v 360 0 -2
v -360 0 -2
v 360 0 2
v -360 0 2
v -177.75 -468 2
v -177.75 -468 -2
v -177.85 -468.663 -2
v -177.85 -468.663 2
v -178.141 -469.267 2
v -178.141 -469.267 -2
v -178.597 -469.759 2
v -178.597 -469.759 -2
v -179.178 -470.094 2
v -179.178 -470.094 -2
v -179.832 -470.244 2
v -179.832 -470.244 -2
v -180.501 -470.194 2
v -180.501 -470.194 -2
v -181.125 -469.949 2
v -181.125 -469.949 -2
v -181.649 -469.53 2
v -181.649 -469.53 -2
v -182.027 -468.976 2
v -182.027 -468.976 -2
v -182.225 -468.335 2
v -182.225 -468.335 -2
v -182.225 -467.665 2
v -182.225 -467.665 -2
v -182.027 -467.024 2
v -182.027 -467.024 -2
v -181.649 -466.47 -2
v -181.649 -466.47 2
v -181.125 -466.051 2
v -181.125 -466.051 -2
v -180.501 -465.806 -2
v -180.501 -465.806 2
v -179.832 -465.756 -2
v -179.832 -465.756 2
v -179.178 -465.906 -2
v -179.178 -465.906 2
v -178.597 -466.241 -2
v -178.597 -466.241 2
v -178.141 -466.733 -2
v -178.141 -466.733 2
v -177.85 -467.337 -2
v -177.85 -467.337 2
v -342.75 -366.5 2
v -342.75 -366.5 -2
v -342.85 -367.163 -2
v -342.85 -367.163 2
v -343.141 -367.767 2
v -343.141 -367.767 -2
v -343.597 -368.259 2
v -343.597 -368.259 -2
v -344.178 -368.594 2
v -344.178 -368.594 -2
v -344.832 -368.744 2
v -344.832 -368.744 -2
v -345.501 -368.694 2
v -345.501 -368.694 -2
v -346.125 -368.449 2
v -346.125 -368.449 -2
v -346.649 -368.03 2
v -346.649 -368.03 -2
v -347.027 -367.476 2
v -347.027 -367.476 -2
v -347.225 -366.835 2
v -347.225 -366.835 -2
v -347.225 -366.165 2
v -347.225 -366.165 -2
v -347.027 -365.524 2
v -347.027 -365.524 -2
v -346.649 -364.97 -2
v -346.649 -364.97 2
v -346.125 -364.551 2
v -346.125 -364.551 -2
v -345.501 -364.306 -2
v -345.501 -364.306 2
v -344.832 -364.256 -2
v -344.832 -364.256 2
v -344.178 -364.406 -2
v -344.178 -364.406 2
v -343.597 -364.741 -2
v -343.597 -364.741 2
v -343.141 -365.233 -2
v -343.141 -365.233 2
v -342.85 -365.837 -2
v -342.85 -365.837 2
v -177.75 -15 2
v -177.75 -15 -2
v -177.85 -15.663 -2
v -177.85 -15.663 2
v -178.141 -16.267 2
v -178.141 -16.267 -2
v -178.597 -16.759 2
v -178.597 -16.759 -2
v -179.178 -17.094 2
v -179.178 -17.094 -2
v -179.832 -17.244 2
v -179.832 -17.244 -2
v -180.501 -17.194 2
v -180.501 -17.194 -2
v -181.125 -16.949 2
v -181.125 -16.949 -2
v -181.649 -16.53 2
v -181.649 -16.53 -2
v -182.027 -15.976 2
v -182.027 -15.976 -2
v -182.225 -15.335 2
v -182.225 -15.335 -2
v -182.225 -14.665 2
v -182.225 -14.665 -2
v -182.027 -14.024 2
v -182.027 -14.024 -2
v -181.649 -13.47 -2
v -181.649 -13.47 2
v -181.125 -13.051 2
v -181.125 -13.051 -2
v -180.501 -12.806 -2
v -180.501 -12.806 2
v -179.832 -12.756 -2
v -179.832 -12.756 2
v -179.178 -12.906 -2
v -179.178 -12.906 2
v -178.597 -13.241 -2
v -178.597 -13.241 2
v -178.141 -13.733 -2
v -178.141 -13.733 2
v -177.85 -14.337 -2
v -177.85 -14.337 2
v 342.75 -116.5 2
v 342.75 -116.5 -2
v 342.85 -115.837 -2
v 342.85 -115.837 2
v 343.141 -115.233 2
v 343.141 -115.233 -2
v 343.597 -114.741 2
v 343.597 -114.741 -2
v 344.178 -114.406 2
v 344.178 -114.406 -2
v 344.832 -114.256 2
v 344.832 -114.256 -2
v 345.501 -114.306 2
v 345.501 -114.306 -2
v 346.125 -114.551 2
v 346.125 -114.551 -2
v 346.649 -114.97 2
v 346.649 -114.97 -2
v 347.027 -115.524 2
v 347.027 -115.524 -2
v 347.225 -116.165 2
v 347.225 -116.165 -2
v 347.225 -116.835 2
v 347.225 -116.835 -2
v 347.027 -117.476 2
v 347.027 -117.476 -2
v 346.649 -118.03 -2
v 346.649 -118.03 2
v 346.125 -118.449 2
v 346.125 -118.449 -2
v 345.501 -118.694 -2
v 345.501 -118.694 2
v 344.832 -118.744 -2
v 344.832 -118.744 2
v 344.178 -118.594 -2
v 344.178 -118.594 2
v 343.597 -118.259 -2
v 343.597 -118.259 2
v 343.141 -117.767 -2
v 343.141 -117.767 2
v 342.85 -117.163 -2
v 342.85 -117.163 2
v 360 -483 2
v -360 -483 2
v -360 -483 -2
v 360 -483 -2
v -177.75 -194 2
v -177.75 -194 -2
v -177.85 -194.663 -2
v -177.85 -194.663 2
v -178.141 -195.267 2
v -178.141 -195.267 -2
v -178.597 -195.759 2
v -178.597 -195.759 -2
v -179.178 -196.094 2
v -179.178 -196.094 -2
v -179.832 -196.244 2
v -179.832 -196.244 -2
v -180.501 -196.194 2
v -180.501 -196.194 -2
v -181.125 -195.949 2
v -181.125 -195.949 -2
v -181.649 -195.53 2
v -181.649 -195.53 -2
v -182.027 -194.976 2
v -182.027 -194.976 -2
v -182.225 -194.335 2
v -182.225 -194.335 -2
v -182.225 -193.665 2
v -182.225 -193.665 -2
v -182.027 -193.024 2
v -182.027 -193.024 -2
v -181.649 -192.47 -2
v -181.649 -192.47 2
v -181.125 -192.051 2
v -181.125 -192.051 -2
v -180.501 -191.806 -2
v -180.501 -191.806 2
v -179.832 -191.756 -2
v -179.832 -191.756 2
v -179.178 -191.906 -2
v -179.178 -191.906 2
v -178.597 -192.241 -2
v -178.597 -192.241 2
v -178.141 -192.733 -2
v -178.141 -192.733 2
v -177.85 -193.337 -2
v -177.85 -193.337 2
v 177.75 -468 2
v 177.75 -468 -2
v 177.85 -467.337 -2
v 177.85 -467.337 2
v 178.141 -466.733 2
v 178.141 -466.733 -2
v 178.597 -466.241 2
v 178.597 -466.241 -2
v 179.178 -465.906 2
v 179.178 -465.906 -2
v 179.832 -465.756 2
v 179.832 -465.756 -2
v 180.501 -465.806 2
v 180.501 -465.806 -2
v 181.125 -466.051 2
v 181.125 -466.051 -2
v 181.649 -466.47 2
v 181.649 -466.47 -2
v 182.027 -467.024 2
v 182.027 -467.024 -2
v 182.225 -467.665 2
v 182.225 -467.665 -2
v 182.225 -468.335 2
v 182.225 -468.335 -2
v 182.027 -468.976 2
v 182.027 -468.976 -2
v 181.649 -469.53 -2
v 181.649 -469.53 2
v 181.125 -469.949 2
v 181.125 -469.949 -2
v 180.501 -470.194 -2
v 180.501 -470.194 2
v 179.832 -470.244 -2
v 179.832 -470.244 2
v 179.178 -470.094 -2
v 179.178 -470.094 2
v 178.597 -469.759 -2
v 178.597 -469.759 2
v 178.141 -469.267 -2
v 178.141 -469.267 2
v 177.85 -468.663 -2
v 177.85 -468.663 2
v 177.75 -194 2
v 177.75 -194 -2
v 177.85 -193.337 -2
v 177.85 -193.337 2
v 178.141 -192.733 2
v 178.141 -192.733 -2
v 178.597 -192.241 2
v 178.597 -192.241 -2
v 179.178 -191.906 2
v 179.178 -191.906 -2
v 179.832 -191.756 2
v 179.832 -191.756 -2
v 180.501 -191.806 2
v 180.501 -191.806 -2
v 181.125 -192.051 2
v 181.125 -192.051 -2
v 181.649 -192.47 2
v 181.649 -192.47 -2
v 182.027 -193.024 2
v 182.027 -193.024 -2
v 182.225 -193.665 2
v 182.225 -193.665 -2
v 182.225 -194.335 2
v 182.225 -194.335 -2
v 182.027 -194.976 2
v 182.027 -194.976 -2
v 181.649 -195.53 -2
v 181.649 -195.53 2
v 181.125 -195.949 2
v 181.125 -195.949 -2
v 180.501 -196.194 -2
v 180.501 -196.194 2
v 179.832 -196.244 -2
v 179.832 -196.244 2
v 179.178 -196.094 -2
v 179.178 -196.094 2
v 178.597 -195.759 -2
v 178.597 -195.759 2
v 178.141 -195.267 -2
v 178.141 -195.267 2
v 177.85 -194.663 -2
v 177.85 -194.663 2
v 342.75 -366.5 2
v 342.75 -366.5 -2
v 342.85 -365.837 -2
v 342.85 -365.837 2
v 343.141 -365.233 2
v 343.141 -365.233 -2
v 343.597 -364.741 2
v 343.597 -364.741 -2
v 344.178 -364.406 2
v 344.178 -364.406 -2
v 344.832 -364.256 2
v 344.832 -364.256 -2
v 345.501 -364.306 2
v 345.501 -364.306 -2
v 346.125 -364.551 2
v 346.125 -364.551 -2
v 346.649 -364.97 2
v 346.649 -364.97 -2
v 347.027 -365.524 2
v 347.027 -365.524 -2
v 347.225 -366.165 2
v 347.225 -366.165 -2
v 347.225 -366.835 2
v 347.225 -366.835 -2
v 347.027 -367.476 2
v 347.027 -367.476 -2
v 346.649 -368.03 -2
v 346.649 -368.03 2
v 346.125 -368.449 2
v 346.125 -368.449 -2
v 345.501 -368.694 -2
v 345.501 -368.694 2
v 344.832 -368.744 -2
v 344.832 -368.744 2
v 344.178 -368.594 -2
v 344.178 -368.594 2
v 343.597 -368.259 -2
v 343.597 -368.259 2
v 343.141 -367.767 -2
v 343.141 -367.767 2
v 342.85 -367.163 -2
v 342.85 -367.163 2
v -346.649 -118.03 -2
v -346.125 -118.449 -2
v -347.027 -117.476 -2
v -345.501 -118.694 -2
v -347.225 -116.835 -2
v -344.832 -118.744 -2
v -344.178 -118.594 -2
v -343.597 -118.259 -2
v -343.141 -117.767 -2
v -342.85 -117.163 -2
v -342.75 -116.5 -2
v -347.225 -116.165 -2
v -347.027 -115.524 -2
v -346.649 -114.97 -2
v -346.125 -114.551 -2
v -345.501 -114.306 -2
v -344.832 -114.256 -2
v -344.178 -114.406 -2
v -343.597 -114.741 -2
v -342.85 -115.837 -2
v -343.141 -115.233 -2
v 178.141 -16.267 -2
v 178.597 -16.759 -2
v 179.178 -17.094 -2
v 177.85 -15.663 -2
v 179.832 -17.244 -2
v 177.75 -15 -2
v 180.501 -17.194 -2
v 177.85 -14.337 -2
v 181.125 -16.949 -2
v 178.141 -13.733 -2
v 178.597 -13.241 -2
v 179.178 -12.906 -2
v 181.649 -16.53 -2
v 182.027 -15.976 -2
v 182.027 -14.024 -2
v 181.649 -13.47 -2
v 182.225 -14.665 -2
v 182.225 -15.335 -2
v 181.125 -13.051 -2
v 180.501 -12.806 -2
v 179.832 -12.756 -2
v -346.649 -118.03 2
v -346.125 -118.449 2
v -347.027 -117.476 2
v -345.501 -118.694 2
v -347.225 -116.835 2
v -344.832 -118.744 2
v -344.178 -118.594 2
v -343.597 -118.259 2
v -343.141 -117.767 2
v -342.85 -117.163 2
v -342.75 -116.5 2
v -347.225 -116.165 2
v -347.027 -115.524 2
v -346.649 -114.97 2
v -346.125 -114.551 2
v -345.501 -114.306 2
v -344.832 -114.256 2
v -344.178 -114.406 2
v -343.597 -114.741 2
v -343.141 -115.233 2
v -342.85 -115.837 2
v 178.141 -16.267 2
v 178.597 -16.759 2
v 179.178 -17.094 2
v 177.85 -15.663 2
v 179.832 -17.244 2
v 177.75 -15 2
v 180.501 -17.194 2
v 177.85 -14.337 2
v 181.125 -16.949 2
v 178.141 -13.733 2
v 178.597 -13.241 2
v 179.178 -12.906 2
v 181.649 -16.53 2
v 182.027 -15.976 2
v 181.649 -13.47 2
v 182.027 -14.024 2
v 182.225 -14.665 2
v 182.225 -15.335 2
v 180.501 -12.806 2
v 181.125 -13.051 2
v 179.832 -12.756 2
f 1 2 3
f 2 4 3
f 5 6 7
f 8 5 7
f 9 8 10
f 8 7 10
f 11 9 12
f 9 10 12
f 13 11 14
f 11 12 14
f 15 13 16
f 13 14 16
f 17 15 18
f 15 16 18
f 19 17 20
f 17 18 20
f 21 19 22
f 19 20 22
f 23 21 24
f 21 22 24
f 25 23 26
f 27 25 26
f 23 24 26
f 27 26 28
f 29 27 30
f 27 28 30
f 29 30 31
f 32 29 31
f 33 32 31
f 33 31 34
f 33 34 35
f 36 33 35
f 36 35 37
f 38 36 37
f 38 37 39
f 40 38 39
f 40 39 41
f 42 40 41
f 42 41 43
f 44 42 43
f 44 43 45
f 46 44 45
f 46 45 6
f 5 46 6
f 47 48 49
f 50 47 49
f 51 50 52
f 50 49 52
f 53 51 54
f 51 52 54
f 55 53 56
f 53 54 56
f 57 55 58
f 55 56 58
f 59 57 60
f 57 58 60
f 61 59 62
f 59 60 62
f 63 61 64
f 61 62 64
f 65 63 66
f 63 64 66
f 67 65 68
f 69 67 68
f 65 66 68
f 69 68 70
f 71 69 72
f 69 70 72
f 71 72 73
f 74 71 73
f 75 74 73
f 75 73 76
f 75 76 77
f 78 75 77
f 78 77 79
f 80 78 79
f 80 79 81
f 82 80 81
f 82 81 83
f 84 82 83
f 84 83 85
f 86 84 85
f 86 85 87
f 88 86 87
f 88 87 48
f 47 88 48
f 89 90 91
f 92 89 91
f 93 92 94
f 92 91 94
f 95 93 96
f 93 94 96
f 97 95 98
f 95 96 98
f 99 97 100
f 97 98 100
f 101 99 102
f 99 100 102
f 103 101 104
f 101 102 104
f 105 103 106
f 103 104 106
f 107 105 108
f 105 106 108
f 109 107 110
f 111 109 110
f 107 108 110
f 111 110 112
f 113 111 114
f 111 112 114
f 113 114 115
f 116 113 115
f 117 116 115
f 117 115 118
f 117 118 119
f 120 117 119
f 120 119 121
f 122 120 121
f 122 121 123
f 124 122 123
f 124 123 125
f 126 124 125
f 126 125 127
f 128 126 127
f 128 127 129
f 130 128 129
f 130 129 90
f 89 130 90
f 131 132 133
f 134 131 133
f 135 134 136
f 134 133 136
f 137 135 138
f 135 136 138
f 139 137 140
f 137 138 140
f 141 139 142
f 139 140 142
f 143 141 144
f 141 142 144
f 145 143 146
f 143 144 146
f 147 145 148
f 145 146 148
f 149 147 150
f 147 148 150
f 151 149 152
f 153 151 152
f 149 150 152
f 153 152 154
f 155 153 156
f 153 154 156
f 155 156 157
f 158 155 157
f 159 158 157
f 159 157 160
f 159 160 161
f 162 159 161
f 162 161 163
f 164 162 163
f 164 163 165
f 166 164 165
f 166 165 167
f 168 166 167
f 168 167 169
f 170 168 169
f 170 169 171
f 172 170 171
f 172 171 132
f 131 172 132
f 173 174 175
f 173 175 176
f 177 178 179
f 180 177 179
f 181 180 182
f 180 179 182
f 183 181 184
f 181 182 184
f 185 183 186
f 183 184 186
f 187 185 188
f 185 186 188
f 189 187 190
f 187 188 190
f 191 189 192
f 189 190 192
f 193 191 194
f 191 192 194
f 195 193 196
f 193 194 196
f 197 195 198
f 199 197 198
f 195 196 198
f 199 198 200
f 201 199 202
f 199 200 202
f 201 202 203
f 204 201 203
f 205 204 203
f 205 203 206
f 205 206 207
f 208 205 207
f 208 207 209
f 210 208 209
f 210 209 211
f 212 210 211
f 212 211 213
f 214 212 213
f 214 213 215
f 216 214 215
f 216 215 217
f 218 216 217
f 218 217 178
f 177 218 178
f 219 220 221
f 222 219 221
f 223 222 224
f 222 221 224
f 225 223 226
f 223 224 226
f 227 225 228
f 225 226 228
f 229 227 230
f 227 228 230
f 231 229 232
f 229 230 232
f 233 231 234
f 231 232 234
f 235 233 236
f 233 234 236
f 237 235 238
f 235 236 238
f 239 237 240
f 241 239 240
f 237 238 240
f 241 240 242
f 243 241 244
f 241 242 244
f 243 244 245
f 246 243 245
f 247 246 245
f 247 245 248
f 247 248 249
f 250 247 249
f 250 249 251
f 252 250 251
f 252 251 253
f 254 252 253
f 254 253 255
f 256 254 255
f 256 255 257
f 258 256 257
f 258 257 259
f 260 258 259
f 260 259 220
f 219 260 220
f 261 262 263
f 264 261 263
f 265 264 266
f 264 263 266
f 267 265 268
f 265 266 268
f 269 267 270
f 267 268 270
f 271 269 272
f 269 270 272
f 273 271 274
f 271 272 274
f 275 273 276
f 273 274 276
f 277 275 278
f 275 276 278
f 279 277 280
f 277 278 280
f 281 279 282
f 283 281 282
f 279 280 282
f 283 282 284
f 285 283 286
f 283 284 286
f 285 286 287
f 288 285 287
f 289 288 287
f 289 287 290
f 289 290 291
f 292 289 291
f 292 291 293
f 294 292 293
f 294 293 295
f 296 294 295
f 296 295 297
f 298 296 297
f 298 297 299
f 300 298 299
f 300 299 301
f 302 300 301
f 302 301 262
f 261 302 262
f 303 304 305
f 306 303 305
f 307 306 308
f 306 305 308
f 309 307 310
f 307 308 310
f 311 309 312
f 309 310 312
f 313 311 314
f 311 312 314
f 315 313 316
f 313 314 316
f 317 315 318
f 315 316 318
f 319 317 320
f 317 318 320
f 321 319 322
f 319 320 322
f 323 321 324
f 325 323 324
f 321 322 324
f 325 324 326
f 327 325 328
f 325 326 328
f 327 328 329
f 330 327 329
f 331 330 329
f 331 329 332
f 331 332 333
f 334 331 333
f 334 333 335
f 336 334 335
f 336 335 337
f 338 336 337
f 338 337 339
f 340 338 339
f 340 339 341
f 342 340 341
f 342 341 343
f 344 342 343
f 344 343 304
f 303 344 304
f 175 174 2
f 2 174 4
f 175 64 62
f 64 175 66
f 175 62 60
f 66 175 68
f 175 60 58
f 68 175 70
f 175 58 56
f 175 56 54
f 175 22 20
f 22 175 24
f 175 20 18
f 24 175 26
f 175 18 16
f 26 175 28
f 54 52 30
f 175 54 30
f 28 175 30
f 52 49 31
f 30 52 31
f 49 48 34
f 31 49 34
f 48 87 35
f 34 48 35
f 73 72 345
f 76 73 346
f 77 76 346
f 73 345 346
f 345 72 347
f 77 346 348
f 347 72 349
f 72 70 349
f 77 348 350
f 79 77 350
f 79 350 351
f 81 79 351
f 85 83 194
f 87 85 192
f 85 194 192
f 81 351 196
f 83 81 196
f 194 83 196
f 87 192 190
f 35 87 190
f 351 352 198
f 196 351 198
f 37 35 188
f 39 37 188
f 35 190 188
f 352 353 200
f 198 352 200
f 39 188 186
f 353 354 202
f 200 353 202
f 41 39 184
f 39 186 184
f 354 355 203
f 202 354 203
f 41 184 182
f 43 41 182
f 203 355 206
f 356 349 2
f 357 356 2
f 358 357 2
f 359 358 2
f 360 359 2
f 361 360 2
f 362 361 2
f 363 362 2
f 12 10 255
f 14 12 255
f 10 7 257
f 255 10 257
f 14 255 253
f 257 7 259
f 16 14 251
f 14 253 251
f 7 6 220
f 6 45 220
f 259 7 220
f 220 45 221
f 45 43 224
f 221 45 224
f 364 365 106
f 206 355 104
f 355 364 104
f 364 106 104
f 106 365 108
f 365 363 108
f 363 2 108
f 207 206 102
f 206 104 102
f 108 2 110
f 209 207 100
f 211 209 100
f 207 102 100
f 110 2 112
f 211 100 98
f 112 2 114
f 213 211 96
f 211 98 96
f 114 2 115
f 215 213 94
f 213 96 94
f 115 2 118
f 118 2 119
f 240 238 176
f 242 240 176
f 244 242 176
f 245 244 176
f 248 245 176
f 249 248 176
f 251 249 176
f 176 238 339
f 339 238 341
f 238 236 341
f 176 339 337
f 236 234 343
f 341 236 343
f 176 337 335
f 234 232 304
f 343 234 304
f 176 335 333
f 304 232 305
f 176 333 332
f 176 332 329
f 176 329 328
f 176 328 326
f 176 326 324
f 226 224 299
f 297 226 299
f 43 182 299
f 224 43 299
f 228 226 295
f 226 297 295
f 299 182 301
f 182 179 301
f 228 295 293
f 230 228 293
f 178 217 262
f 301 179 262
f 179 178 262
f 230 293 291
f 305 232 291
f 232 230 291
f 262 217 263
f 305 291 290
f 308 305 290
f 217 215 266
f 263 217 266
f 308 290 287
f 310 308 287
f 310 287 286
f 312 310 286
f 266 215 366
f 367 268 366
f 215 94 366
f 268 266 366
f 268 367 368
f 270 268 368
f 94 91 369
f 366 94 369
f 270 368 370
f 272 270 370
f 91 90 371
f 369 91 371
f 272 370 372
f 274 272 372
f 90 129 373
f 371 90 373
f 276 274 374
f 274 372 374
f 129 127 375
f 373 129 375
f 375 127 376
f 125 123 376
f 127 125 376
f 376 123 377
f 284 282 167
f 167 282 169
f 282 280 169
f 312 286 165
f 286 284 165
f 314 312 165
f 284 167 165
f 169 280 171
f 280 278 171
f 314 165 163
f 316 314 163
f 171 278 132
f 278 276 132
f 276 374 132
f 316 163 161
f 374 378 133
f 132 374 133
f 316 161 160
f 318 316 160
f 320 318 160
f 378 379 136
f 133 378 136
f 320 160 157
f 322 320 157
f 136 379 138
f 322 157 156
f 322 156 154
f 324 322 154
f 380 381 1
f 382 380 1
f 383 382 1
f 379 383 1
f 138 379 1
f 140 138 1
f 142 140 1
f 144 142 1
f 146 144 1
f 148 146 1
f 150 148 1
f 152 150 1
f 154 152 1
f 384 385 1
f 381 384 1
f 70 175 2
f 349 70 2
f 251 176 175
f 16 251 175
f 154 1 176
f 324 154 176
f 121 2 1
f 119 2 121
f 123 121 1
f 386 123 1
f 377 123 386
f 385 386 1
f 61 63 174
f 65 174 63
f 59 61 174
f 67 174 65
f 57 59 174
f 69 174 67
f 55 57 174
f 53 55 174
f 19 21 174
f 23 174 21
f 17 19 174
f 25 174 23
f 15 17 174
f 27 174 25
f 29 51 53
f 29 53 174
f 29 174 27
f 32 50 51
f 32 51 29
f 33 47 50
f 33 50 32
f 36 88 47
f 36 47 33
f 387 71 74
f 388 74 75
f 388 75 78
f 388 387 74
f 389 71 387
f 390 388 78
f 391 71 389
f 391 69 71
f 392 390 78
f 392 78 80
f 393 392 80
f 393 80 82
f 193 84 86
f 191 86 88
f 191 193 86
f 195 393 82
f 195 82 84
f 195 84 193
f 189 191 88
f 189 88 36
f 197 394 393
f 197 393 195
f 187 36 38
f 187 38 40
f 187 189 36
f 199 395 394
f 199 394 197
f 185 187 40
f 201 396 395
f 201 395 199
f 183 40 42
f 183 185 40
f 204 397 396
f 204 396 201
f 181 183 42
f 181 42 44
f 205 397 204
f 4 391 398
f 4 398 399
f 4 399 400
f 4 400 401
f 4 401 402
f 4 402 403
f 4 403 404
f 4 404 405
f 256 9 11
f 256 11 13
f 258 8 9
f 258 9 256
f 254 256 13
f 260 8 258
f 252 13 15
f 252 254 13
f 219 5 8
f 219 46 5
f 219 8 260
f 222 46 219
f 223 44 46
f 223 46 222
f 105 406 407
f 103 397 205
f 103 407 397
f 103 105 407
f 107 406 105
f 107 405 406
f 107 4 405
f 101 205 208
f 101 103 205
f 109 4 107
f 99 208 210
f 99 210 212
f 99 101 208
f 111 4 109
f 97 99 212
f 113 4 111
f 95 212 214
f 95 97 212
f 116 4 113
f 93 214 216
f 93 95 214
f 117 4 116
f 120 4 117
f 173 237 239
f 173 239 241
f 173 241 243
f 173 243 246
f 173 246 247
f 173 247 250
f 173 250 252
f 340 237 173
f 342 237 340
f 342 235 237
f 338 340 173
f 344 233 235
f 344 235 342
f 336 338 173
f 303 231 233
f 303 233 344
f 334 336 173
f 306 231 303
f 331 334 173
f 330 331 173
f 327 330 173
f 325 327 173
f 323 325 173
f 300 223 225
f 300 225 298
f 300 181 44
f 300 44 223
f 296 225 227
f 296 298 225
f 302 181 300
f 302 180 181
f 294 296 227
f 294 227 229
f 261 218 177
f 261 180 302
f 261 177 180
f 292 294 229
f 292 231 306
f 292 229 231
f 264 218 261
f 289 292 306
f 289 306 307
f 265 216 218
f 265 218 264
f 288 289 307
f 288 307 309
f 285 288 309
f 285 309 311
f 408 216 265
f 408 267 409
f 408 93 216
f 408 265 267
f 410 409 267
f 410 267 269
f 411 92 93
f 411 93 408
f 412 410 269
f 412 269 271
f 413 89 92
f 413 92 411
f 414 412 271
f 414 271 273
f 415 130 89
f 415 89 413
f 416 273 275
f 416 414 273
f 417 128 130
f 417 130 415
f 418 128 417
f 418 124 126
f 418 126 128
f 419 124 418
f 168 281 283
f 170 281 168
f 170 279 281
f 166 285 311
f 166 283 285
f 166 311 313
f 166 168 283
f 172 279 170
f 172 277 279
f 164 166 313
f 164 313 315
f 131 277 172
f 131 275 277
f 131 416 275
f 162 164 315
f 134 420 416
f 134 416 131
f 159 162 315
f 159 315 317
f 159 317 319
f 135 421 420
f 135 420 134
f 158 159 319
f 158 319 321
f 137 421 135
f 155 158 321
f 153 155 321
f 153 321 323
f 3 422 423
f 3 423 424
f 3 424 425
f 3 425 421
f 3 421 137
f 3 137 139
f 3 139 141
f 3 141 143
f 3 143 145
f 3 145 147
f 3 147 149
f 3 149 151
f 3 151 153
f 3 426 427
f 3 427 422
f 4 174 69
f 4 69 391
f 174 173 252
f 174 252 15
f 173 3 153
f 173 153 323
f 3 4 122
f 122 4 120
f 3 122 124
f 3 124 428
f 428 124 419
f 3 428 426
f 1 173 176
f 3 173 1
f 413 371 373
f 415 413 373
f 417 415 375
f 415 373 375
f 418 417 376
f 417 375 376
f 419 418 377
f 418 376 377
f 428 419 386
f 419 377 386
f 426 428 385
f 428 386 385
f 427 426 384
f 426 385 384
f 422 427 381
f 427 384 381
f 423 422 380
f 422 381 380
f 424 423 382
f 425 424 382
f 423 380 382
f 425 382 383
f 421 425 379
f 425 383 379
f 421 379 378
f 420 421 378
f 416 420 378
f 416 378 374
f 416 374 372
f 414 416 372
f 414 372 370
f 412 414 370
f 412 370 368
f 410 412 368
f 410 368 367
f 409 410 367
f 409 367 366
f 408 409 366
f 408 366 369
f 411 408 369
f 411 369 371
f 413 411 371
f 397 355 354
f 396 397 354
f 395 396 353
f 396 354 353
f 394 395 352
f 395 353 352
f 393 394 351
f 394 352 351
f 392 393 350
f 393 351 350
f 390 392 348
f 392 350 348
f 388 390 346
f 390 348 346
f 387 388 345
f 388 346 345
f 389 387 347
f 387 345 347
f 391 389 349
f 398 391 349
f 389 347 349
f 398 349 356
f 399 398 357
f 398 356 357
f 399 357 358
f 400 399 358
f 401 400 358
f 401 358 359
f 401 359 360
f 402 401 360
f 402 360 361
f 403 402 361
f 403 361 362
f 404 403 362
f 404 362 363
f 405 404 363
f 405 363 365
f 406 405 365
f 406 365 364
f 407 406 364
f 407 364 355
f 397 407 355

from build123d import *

# Parameters (mm, degrees)
SKETCH1_W           = 720
SKETCH1_H           = 483
BOSS_EXTRUDE1_DEPTH = 2
SKETCH2_R           = 2.25
CUT_EXTRUDE1_DEPTH  = 603.415969244


with BuildPart() as part:
    # Sketch1 → Boss-Extrude1 (new, symmetric)
    with BuildSketch(Plane.XY):
        with Locations((0, -241.5)):
            Rectangle(SKETCH1_W, SKETCH1_H)
    extrude(amount=BOSS_EXTRUDE1_DEPTH, both=True)

    # Sketch2 → Cut-Extrude1 (cut, through all)
    with BuildSketch(Plane(origin=(0, 0, -2), x_dir=(-1, 0, 0), z_dir=(0, 0, -1))):
        with Locations((-345, -116.5)):
            Circle(SKETCH2_R)
        with Locations((-180, -15)):
            Circle(SKETCH2_R)
        with Locations((-180, -194)):
            Circle(SKETCH2_R)
        with Locations(Location((180, -194, 0), (0, 0, 180))):
            Circle(SKETCH2_R)
        with Locations(Location((345, -116.5, 0), (0, 0, 180))):
            Circle(SKETCH2_R)
        with Locations(Location((180, -15, 0), (0, 0, 180))):
            Circle(SKETCH2_R)
        with Locations((-345, -366.5)):
            Circle(SKETCH2_R)
        with Locations(Location((345, -366.5, 0), (0, 0, 180))):
            Circle(SKETCH2_R)
        with Locations((-180, -468)):
            Circle(SKETCH2_R)
        with Locations(Location((180, -468, 0), (0, 0, 180))):
            Circle(SKETCH2_R)
    extrude(amount=-CUT_EXTRUDE1_DEPTH, mode=Mode.SUBTRACT)


solid = part.part
